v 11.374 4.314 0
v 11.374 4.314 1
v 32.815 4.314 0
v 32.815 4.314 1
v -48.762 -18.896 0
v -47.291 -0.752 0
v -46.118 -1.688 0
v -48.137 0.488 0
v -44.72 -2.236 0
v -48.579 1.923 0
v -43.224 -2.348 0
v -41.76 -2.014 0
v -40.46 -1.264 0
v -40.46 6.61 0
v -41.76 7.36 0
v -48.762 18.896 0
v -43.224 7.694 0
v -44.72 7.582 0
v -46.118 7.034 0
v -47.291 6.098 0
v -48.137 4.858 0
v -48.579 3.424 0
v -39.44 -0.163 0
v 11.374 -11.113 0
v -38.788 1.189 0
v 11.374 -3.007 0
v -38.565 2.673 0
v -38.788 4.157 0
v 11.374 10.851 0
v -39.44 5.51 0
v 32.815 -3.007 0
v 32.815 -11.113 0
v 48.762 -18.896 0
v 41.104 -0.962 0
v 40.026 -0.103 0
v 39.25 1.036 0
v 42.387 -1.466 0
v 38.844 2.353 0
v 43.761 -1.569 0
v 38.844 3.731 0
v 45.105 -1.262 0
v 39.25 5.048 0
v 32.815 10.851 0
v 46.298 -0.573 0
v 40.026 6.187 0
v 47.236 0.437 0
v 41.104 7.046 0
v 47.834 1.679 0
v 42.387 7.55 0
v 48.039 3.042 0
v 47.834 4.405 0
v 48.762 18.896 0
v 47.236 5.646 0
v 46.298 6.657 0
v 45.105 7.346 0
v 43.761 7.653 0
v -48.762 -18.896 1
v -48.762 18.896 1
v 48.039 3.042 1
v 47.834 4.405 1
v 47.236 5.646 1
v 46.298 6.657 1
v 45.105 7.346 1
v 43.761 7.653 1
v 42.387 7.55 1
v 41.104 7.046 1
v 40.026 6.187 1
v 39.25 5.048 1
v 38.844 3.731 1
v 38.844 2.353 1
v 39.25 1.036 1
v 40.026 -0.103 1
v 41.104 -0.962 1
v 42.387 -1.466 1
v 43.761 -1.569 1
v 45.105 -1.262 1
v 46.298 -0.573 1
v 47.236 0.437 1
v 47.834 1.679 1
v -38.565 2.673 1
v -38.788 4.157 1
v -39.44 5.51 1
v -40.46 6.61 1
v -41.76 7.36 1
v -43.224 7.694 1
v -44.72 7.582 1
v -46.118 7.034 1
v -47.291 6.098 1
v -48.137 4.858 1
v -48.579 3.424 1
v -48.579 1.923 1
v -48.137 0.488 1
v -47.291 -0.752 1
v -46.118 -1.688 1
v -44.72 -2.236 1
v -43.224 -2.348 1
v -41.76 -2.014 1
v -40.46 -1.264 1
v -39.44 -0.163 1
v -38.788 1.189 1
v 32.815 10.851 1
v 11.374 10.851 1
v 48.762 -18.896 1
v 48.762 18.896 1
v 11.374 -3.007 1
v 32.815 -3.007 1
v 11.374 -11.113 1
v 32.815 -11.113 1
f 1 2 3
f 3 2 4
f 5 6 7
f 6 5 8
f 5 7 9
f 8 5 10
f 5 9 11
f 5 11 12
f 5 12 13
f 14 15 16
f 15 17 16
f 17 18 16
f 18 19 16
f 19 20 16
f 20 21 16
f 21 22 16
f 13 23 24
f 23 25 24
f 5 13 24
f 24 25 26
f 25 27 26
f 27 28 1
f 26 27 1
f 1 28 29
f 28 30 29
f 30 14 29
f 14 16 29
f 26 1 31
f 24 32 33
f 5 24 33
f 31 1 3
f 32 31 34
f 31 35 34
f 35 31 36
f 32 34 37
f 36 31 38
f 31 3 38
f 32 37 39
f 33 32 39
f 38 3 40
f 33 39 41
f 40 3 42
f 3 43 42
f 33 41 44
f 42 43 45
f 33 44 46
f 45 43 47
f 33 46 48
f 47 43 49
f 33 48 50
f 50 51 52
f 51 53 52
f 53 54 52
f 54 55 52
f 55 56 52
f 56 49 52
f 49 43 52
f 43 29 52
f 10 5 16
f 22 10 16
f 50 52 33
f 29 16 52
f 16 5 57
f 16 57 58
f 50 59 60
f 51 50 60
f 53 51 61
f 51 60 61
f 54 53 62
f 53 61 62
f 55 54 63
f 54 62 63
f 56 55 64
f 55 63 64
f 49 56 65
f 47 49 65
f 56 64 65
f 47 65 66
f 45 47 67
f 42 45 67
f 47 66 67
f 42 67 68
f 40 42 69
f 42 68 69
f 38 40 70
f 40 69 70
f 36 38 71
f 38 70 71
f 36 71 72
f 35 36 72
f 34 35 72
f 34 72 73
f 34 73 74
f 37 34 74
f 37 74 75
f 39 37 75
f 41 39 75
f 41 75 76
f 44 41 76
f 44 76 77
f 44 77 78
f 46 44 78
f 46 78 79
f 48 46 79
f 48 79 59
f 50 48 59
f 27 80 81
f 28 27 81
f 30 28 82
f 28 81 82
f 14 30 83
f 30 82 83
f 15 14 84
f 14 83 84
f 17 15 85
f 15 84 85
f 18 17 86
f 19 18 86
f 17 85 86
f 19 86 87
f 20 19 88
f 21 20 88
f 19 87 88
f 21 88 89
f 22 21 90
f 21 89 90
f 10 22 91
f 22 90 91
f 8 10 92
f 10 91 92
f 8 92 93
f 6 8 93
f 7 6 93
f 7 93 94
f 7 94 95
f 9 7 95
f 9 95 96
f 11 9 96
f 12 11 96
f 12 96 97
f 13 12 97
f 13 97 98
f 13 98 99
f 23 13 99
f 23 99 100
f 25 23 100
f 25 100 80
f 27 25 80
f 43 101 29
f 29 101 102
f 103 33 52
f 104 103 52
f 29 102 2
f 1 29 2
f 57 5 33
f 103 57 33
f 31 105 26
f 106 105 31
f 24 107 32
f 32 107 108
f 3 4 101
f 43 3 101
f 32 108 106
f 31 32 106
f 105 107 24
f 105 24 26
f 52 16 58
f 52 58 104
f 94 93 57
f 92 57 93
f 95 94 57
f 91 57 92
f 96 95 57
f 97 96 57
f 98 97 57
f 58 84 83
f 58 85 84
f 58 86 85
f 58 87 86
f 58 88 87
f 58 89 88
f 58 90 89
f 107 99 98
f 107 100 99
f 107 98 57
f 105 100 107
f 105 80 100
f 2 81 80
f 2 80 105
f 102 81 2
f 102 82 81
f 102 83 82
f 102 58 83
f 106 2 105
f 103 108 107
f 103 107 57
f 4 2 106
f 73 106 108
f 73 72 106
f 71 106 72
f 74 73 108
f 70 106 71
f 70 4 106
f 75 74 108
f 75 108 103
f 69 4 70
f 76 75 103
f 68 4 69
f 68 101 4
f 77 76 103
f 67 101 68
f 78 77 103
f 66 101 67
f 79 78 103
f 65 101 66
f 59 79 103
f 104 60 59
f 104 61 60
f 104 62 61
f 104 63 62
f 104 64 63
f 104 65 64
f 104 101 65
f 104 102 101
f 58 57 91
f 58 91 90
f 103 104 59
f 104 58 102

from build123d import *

# Parameters (mm, degrees)
F0_W     = 97.523712
F0_H     = 37.792742
F1_DEPTH = 1
F2_R     = 4.623594
F2_R_2   = 5.035286
F3_DEPTH = 25.4
F4_W     = 21.440587
F4_H     = 8.105589
F5_DEPTH = 25.4


with BuildPart() as f1:
    # F0 (on Top) → F1 (new body)
    with BuildSketch(Plane.XY):
        Rectangle(F0_W, F0_H)
    extrude(amount=F1_DEPTH)

    # F2 (on face) → F3 (cut)
    with BuildSketch(Plane.XY.offset(1)):
        with Locations((43.415565, 3.041855)):
            Circle(F2_R)
        with Locations((-43.599922, 2.673145)):
            Circle(F2_R_2)
    extrude(amount=-F3_DEPTH, mode=Mode.SUBTRACT)

    # F4 (on face) → F5 (cut)
    with BuildSketch(Plane.XY.offset(1)):
        Polygon((32.814559, 4.314265), (32.814559, 10.85103), (11.373972, 10.85103), (11.373972, 4.314265), (13.988677, 4.314265), align=None)
        with Locations((22.094265, -7.059706)):
            Rectangle(F4_W, F4_H)
    extrude(amount=-F5_DEPTH, mode=Mode.SUBTRACT)


solid = f1.part
